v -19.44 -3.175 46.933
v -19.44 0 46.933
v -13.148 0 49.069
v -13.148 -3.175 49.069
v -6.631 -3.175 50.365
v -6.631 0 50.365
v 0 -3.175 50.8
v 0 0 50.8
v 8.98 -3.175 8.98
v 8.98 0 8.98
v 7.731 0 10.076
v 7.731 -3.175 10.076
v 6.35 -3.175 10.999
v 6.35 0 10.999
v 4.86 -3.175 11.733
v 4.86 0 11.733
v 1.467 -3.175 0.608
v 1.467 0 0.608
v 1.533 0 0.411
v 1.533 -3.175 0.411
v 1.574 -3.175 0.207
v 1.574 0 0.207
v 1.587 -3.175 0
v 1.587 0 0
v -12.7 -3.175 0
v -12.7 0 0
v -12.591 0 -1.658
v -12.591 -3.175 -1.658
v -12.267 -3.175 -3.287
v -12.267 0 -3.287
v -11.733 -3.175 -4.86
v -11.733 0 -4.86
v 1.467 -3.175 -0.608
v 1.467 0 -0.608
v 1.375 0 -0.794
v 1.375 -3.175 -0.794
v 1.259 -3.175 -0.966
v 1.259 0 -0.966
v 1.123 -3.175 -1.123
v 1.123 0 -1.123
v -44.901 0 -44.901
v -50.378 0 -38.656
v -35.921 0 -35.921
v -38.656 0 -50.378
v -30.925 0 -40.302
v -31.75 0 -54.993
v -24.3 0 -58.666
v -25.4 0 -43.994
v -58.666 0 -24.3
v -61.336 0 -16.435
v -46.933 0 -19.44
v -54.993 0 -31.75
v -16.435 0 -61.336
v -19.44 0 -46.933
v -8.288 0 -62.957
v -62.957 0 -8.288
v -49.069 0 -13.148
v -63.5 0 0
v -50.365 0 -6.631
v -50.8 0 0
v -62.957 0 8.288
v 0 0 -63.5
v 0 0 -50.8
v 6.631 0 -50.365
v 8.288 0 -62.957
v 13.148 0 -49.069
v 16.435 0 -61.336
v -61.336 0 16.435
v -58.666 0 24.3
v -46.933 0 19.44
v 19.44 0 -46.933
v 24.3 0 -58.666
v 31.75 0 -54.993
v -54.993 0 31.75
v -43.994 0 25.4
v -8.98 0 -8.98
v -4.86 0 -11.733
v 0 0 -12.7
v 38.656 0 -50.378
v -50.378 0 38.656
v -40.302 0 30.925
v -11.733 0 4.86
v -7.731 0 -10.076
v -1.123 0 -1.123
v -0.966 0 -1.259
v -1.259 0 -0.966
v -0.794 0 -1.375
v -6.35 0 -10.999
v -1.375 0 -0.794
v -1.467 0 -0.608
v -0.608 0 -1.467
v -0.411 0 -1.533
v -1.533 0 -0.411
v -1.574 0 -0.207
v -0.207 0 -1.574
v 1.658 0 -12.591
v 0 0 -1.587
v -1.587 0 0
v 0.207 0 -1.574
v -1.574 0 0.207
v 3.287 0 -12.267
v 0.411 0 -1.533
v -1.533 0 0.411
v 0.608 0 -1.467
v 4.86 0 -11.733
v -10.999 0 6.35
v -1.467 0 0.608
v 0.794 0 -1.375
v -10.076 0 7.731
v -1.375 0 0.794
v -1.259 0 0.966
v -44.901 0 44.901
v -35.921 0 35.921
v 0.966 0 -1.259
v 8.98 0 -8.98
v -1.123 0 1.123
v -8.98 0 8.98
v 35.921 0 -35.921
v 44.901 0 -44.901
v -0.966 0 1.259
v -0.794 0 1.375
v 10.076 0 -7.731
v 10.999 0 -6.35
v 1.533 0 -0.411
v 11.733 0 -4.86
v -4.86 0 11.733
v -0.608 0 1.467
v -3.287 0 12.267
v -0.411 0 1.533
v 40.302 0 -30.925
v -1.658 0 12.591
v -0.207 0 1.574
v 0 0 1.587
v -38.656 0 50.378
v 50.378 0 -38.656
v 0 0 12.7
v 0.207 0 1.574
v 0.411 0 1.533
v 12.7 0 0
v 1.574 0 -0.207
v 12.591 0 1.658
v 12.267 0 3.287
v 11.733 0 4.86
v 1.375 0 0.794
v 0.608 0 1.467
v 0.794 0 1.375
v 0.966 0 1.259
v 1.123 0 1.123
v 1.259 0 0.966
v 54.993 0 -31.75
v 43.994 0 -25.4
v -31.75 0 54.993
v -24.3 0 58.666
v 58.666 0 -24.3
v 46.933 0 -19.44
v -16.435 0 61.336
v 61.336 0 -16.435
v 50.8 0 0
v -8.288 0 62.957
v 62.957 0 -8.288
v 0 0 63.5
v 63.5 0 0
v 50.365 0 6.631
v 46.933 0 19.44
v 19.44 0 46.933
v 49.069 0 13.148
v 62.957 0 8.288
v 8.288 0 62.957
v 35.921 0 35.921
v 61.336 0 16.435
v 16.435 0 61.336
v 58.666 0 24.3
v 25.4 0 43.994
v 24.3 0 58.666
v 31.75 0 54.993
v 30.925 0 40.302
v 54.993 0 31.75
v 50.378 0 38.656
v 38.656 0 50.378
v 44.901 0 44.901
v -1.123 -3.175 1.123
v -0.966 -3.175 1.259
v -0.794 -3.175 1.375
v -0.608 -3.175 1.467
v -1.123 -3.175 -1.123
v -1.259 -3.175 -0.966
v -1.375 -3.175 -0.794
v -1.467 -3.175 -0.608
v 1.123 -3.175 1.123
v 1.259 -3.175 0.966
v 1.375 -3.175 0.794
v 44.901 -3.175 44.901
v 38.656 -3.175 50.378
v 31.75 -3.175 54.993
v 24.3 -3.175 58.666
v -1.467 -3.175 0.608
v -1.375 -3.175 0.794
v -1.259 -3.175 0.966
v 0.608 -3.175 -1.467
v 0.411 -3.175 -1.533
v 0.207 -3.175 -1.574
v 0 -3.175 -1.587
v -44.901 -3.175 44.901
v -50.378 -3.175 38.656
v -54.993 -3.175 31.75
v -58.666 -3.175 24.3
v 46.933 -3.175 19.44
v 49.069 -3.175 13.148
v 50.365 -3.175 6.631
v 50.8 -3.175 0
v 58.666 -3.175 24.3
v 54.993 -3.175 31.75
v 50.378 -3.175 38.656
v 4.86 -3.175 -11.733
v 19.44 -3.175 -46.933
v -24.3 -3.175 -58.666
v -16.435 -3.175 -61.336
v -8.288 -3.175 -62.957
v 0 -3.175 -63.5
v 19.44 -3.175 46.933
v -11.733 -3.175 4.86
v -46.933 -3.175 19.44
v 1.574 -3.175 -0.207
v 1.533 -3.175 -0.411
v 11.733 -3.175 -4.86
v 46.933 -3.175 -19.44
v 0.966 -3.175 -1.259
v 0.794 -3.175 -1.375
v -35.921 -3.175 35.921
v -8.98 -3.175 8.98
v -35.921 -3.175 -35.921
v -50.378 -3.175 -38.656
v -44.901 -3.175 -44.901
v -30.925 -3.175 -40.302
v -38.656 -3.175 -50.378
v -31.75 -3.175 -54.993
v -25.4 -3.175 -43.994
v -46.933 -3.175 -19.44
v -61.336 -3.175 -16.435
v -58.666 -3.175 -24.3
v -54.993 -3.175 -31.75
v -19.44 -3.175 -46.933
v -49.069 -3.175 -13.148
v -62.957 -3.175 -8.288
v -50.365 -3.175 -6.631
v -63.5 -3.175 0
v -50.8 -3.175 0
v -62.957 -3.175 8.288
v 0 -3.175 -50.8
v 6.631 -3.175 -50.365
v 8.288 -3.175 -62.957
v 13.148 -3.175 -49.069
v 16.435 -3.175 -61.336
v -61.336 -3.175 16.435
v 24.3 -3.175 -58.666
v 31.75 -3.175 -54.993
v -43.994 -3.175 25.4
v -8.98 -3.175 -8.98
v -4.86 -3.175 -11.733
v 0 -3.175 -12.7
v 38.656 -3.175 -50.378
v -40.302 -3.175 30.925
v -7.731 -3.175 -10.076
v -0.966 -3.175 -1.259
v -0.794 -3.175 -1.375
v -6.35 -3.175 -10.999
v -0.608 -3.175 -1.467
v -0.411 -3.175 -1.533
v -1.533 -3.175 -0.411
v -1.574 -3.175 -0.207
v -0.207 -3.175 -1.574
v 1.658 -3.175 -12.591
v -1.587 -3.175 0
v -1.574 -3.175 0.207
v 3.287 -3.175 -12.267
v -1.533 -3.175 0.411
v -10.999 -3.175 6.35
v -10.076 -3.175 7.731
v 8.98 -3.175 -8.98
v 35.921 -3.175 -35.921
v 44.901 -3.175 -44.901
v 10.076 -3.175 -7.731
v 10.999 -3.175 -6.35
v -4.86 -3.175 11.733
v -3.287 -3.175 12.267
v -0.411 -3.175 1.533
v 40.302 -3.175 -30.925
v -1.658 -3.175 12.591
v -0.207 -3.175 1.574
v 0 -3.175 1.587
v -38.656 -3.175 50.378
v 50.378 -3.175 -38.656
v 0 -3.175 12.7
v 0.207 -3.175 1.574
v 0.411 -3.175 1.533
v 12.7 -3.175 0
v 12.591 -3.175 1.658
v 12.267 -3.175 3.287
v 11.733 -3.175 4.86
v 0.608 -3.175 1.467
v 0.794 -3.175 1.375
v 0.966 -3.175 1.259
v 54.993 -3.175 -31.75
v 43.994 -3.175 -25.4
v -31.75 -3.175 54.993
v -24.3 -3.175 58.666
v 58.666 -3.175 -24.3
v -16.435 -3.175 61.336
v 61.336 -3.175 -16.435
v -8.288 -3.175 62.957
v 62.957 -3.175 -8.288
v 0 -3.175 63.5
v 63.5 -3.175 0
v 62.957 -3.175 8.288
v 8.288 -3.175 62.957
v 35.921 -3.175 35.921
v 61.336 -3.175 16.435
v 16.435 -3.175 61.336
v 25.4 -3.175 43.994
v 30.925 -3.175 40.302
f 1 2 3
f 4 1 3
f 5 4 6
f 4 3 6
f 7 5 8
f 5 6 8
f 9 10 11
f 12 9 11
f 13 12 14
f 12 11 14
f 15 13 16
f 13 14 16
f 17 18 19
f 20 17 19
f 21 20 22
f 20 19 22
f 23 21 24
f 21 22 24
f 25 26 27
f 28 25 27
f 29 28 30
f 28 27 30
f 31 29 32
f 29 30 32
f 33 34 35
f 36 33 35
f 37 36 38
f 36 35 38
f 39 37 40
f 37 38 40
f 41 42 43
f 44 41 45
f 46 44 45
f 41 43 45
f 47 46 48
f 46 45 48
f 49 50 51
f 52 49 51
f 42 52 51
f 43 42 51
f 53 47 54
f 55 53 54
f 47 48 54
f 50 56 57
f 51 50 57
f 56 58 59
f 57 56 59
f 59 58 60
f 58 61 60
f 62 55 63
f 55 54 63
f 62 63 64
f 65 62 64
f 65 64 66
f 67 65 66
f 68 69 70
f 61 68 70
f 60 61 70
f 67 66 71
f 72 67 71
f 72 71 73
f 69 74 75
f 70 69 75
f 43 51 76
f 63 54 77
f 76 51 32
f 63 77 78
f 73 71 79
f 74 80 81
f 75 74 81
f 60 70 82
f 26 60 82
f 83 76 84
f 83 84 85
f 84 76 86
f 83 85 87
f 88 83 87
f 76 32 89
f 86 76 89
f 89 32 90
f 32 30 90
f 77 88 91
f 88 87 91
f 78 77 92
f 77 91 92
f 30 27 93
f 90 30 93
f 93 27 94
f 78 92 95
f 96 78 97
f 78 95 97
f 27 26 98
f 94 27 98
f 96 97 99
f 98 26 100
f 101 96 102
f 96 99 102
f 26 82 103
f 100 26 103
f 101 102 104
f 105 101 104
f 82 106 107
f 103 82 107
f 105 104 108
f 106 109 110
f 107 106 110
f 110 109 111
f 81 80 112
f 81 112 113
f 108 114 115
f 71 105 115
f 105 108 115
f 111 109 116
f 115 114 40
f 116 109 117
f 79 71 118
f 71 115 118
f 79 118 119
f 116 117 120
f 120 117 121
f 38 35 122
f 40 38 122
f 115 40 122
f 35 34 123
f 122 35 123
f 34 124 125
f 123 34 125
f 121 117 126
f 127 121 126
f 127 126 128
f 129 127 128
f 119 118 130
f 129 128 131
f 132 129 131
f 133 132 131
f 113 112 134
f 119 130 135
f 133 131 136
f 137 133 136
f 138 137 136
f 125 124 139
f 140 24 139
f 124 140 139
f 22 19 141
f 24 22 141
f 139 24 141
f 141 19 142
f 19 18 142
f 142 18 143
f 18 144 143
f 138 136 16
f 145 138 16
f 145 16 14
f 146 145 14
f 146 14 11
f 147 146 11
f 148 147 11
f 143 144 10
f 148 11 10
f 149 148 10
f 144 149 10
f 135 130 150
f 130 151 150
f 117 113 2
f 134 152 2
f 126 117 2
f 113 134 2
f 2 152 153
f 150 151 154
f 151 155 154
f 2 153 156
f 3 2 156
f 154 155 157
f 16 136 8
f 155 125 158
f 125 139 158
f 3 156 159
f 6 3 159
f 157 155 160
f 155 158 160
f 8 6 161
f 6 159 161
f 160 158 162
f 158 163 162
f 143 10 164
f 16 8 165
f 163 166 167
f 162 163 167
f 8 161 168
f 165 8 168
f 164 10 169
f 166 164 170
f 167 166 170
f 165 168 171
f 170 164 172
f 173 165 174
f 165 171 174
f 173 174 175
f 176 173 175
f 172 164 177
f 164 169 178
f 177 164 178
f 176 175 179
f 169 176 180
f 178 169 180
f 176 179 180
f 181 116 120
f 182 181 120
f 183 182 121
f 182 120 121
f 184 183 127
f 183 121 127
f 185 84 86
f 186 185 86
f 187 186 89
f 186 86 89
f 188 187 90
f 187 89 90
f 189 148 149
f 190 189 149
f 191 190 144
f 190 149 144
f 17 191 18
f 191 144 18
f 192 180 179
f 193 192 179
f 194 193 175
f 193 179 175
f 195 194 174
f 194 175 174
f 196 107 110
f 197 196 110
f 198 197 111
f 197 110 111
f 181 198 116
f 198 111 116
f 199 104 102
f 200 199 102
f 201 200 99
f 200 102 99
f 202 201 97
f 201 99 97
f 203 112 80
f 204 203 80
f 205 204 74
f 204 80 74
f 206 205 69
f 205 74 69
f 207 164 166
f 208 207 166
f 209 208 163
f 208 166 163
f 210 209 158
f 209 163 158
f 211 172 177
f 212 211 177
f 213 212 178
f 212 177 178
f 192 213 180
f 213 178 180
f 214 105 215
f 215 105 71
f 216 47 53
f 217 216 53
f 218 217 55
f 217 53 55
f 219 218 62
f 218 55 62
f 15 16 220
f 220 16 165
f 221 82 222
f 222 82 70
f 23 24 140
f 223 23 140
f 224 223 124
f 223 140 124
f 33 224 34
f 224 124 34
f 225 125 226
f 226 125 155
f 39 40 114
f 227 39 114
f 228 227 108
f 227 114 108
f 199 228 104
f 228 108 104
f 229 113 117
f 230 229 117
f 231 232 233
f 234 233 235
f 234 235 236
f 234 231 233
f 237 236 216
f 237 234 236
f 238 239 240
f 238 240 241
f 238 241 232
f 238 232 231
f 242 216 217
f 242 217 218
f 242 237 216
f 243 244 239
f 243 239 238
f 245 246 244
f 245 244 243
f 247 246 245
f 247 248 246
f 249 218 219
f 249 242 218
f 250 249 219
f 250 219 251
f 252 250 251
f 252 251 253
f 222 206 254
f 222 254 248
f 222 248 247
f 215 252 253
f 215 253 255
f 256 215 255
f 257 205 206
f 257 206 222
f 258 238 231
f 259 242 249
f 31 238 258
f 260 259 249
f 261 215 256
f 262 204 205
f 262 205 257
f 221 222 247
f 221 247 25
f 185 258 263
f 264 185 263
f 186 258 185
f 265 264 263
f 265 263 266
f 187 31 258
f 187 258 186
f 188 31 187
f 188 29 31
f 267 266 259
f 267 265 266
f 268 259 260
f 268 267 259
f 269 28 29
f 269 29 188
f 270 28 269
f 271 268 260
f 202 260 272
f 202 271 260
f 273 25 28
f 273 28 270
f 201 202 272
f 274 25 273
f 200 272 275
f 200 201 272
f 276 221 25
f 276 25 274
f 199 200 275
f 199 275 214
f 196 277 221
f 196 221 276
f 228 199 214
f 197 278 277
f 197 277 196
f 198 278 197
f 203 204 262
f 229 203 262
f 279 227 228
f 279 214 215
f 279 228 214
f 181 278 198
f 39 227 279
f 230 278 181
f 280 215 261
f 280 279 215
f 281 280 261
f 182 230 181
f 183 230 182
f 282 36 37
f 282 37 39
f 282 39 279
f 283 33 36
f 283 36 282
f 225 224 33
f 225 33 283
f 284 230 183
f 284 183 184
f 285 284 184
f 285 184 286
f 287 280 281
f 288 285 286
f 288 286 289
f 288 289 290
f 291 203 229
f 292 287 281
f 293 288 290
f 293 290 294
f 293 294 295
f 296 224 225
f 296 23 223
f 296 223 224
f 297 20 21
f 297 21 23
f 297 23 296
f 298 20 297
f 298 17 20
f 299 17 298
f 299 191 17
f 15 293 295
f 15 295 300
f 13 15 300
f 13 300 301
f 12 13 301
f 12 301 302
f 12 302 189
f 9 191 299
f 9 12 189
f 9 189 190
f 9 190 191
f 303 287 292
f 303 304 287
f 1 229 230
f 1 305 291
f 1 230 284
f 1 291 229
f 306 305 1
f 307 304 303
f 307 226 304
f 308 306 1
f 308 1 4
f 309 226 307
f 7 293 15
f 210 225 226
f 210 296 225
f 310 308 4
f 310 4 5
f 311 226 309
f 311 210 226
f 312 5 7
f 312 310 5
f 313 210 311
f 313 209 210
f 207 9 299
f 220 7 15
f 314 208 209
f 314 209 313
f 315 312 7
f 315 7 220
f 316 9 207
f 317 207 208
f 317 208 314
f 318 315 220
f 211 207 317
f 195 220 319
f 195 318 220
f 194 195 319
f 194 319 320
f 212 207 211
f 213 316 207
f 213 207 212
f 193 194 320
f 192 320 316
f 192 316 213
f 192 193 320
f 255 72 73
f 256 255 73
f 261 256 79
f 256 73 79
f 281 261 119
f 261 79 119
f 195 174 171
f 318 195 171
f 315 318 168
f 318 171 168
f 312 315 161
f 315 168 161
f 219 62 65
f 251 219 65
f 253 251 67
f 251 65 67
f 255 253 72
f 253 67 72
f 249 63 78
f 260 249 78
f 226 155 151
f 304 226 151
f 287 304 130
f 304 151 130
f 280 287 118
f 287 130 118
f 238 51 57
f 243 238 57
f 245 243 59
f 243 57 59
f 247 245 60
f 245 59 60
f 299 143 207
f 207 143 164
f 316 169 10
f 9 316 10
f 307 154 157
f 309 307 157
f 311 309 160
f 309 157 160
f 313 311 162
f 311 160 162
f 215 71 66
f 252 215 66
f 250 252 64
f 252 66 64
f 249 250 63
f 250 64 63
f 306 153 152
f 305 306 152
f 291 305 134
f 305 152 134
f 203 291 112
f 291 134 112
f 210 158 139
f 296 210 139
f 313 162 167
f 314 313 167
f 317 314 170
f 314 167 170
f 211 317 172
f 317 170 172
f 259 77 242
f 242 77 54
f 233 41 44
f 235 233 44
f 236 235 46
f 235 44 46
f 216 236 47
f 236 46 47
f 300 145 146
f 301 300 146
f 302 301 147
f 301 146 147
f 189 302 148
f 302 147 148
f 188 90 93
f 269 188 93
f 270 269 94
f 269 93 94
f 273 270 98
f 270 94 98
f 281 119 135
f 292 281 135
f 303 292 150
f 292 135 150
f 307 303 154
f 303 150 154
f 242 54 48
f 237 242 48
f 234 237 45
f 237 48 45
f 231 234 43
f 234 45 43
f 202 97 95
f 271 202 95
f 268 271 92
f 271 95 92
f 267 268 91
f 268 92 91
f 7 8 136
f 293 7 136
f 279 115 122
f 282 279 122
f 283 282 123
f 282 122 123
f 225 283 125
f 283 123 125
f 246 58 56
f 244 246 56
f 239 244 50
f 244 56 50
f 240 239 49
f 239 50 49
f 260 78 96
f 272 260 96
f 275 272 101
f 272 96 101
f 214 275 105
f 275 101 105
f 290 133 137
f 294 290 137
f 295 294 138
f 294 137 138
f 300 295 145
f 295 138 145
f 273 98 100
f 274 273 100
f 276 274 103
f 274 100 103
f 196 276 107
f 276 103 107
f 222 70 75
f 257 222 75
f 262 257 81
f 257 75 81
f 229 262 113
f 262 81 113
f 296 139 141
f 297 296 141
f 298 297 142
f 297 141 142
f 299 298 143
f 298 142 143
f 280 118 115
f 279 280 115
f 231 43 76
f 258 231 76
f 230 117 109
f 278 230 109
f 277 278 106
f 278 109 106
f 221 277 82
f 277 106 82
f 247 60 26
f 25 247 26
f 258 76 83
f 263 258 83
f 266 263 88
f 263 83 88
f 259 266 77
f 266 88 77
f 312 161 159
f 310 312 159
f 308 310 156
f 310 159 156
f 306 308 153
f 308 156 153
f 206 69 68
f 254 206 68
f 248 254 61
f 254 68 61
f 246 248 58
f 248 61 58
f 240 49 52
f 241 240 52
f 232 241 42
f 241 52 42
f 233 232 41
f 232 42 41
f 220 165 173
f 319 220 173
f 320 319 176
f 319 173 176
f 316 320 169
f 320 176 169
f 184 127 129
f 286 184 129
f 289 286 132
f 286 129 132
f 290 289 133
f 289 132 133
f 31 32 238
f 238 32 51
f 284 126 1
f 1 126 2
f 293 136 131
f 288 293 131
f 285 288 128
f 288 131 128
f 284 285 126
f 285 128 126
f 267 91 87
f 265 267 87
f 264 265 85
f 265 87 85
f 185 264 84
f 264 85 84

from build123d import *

# Parameters (mm, degrees)
F1_DEPTH = 3.175


with BuildPart() as f1:
    # F0 (on Front) → F1 (new body)
    with BuildSketch(Plane.XZ):
        with BuildLine():
            Line((35.9210244843, 35.9210244843), (44.9012806053, 44.9012806053))
            ThreePointArc((44.9012806053, 44.9012806053), (35.2787097967, 52.7983203812), (24.3003979552, 58.6663503145))
            Line((24.3003979552, 58.6663503145), (19.4403183641, 46.9330802516))
            ThreePointArc((19.4403183641, 46.9330802516), (28.2229678374, 42.238656305), (35.9210244843, 35.9210244843))
        make_face()
        with BuildLine():
            Line((0, 50.8), (0, 63.5))
            ThreePointArc((0, 63.5), (-12.388235448, 62.2798653056), (-24.3003979552, 58.6663503145))
            Line((-24.3003979552, 58.6663503145), (-19.4403183641, 46.9330802516))
            ThreePointArc((-19.4403183641, 46.9330802516), (-9.9105883584, 49.8238922445), (0, 50.8))
        make_face()
        with BuildLine():
            Line((-35.9210244843, 35.9210244843), (-44.9012806053, 44.9012806053))
            ThreePointArc((-44.9012806053, 44.9012806053), (-52.7983203812, 35.2787097967), (-58.6663503145, 24.3003979552))
            Line((-58.6663503145, 24.3003979552), (-46.9330802516, 19.4403183641))
            ThreePointArc((-46.9330802516, 19.4403183641), (-42.238656305, 28.2229678374), (-35.9210244843, 35.9210244843))
        make_face()
        with BuildLine():
            Line((50.8, 0), (63.5, 0))
            ThreePointArc((63.5, 0), (62.2798653056, 12.388235448), (58.6663503145, 24.3003979552))
            Line((58.6663503145, 24.3003979552), (46.9330802516, 19.4403183641))
            ThreePointArc((46.9330802516, 19.4403183641), (49.8238922445, 9.9105883584), (50.8, 0))
        make_face()
        with BuildLine():
            ThreePointArc((-44.9012806053, -44.9012806053), (-35.2787097967, -52.7983203812), (-24.3003979552, -58.6663503145))
            Line((-24.3003979552, -58.6663503145), (-19.4403183641, -46.9330802516))
            ThreePointArc((-19.4403183641, -46.9330802516), (-28.2229678374, -42.238656305), (-35.9210244843, -35.9210244843))
            Line((-35.9210244843, -35.9210244843), (-44.9012806053, -44.9012806053))
        make_face()
        with BuildLine():
            ThreePointArc((0, -63.5), (12.388235448, -62.2798653056), (24.3003979552, -58.6663503145))
            Line((24.3003979552, -58.6663503145), (19.4403183641, -46.9330802516))
            ThreePointArc((19.4403183641, -46.9330802516), (9.9105883584, -49.8238922445), (0, -50.8))
            Line((0, -50.8), (0, -63.5))
        make_face()
        with BuildLine():
            ThreePointArc((44.9012806053, -44.9012806053), (52.7983203812, -35.2787097967), (58.6663503145, -24.3003979552))
            Line((58.6663503145, -24.3003979552), (46.9330802516, -19.4403183641))
            ThreePointArc((46.9330802516, -19.4403183641), (42.238656305, -28.2229678374), (35.9210244843, -35.9210244843))
            Line((35.9210244843, -35.9210244843), (44.9012806053, -44.9012806053))
        make_face()
        with BuildLine():
            Line((-8.9802561211, 8.9802561211), (-1.1225320151, 1.1225320151))
            ThreePointArc((-1.1225320151, 1.1225320151), (-0.8819677449, 1.3199580095), (-0.6075099489, 1.4666587579))
            Line((-0.6075099489, 1.4666587579), (-4.860079591, 11.7332700629))
            ThreePointArc((-4.860079591, 11.7332700629), (-7.0557419593, 10.5596640762), (-8.9802561211, 8.9802561211))
        make_face()
        with BuildLine():
            Line((0.6075099489, 1.4666587579), (4.860079591, 11.7332700629))
            ThreePointArc((4.860079591, 11.7332700629), (2.4776470896, 12.4559730611), (0, 12.7))
            Line((0, 12.7), (0, 1.5875))
            ThreePointArc((0, 1.5875), (0.3097058862, 1.5569966326), (0.6075099489, 1.4666587579))
        make_face()
        with BuildLine():
            Line((1.1225320151, 1.1225320151), (8.9802561211, 8.9802561211))
            ThreePointArc((8.9802561211, 8.9802561211), (7.0557419593, 10.5596640762), (4.860079591, 11.7332700629))
            Line((4.860079591, 11.7332700629), (0.6075099489, 1.4666587579))
            ThreePointArc((0.6075099489, 1.4666587579), (0.8819677449, 1.3199580095), (1.1225320151, 1.1225320151))
        make_face()
        with BuildLine():
            Line((1.4666587579, 0.6075099489), (11.7332700629, 4.860079591))
            ThreePointArc((11.7332700629, 4.860079591), (10.5596640762, 7.0557419593), (8.9802561211, 8.9802561211))
            Line((8.9802561211, 8.9802561211), (1.1225320151, 1.1225320151))
            ThreePointArc((1.1225320151, 1.1225320151), (1.3199580095, 0.8819677449), (1.4666587579, 0.6075099489))
        make_face()
        with BuildLine():
            Line((1.5875, 0), (12.7, 0))
            ThreePointArc((12.7, 0), (12.4559730611, 2.4776470896), (11.7332700629, 4.860079591))
            Line((11.7332700629, 4.860079591), (1.4666587579, 0.6075099489))
            ThreePointArc((1.4666587579, 0.6075099489), (1.5569966326, 0.3097058862), (1.5875, 0))
        make_face()
        with BuildLine():
            ThreePointArc((11.7332700629, -4.860079591), (12.4559730611, -2.4776470896), (12.7, 0))
            Line((12.7, 0), (1.5875, 0))
            ThreePointArc((1.5875, 0), (1.5569966326, -0.3097058862), (1.4666587579, -0.6075099489))
            Line((1.4666587579, -0.6075099489), (11.7332700629, -4.860079591))
        make_face()
        with BuildLine():
            ThreePointArc((4.860079591, -11.7332700629), (7.0557419593, -10.5596640762), (8.9802561211, -8.9802561211))
            Line((8.9802561211, -8.9802561211), (1.1225320151, -1.1225320151))
            ThreePointArc((1.1225320151, -1.1225320151), (0.8819677449, -1.3199580095), (0.6075099489, -1.4666587579))
            Line((0.6075099489, -1.4666587579), (4.860079591, -11.7332700629))
        make_face()
        with BuildLine():
            Line((-8.9802561211, -8.9802561211), (-1.1225320151, -1.1225320151))
            ThreePointArc((-1.1225320151, -1.1225320151), (-1.3199580095, -0.8819677449), (-1.4666587579, -0.6075099489))
            Line((-1.4666587579, -0.6075099489), (-11.7332700629, -4.860079591))
            ThreePointArc((-11.7332700629, -4.860079591), (-10.5596640762, -7.0557419593), (-8.9802561211, -8.9802561211))
        make_face()
        with BuildLine():
            Line((-12.7, 0), (-1.5875, 0))
            ThreePointArc((-1.5875, 0), (-1.5569966326, 0.3097058862), (-1.4666587579, 0.6075099489))
            Line((-1.4666587579, 0.6075099489), (-11.7332700629, 4.860079591))
            ThreePointArc((-11.7332700629, 4.860079591), (-12.4559730611, 2.4776470896), (-12.7, 0))
        make_face()
        with BuildLine():
            ThreePointArc((-1.4666587579, 0.6075099489), (-1.3199580095, 0.8819677449), (-1.1225320151, 1.1225320151))
            Line((-1.1225320151, 1.1225320151), (-8.9802561211, 8.9802561211))
            ThreePointArc((-8.9802561211, 8.9802561211), (-10.5596640762, 7.0557419593), (-11.7332700629, 4.860079591))
            Line((-11.7332700629, 4.860079591), (-1.4666587579, 0.6075099489))
        make_face()
        with BuildLine():
            ThreePointArc((-1.4666587579, -0.6075099489), (-1.5569966326, -0.3097058862), (-1.5875, 0))
            Line((-1.5875, 0), (-12.7, 0))
            ThreePointArc((-12.7, 0), (-12.4559730611, -2.4776470896), (-11.7332700629, -4.860079591))
            Line((-11.7332700629, -4.860079591), (-1.4666587579, -0.6075099489))
        make_face()
        with BuildLine():
            ThreePointArc((-0.6075099489, -1.4666587579), (-0.8819677449, -1.3199580095), (-1.1225320151, -1.1225320151))
            Line((-1.1225320151, -1.1225320151), (-8.9802561211, -8.9802561211))
            ThreePointArc((-8.9802561211, -8.9802561211), (-7.0557419593, -10.5596640762), (-4.860079591, -11.7332700629))
            Line((-4.860079591, -11.7332700629), (-0.6075099489, -1.4666587579))
        make_face()
        with BuildLine():
            Line((0, -12.7), (0, -1.5875))
            ThreePointArc((0, -1.5875), (-0.3097058862, -1.5569966326), (-0.6075099489, -1.4666587579))
            Line((-0.6075099489, -1.4666587579), (-4.860079591, -11.7332700629))
            ThreePointArc((-4.860079591, -11.7332700629), (-2.4776470896, -12.4559730611), (0, -12.7))
        make_face()
        with BuildLine():
            ThreePointArc((0, -12.7), (2.4776470896, -12.4559730611), (4.860079591, -11.7332700629))
            Line((4.860079591, -11.7332700629), (0.6075099489, -1.4666587579))
            ThreePointArc((0.6075099489, -1.4666587579), (0.3097058862, -1.5569966326), (0, -1.5875))
            Line((0, -1.5875), (0, -12.7))
        make_face()
        with BuildLine():
            ThreePointArc((8.9802561211, -8.9802561211), (10.5596640762, -7.0557419593), (11.7332700629, -4.860079591))
            Line((11.7332700629, -4.860079591), (1.4666587579, -0.6075099489))
            ThreePointArc((1.4666587579, -0.6075099489), (1.3199580095, -0.8819677449), (1.1225320151, -1.1225320151))
            Line((1.1225320151, -1.1225320151), (8.9802561211, -8.9802561211))
        make_face()
        with BuildLine():
            ThreePointArc((-0.6075099489, 1.4666587579), (-0.3097058862, 1.5569966326), (0, 1.5875))
            Line((0, 1.5875), (0, 12.7))
            ThreePointArc((0, 12.7), (-2.4776470896, 12.4559730611), (-4.860079591, 11.7332700629))
            Line((-4.860079591, 11.7332700629), (-0.6075099489, 1.4666587579))
        make_face()
        with BuildLine():
            ThreePointArc((-63.5, 0), (-62.2798653056, -12.388235448), (-58.6663503145, -24.3003979552))
            Line((-58.6663503145, -24.3003979552), (-46.9330802516, -19.4403183641))
            ThreePointArc((-46.9330802516, -19.4403183641), (-49.8238922445, -9.9105883584), (-50.8, 0))
            Line((-50.8, 0), (-63.5, 0))
        make_face()
        with BuildLine():
            Line((-19.4403183641, 46.9330802516), (-24.3003979552, 58.6663503145))
            ThreePointArc((-24.3003979552, 58.6663503145), (-35.2787097967, 52.7983203812), (-44.9012806053, 44.9012806053))
            Line((-44.9012806053, 44.9012806053), (-35.9210244843, 35.9210244843))
            ThreePointArc((-35.9210244843, 35.9210244843), (-28.2229678374, 42.238656305), (-19.4403183641, 46.9330802516))
        make_face()
        with BuildLine():
            Line((19.4403183641, 46.9330802516), (24.3003979552, 58.6663503145))
            ThreePointArc((24.3003979552, 58.6663503145), (12.388235448, 62.2798653056), (0, 63.5))
            Line((0, 63.5), (0, 50.8))
            ThreePointArc((0, 50.8), (9.9105883584, 49.8238922445), (19.4403183641, 46.9330802516))
        make_face()
        with BuildLine():
            Line((46.9330802516, 19.4403183641), (58.6663503145, 24.3003979552))
            ThreePointArc((58.6663503145, 24.3003979552), (52.7983203812, 35.2787097967), (44.9012806053, 44.9012806053))
            Line((44.9012806053, 44.9012806053), (35.9210244843, 35.9210244843))
            ThreePointArc((35.9210244843, 35.9210244843), (42.238656305, 28.2229678374), (46.9330802516, 19.4403183641))
        make_face()
        with BuildLine():
            ThreePointArc((24.3003979552, -58.6663503145), (35.2787097967, -52.7983203812), (44.9012806053, -44.9012806053))
            Line((44.9012806053, -44.9012806053), (35.9210244843, -35.9210244843))
            ThreePointArc((35.9210244843, -35.9210244843), (28.2229678374, -42.238656305), (19.4403183641, -46.9330802516))
            Line((19.4403183641, -46.9330802516), (24.3003979552, -58.6663503145))
        make_face()
        with BuildLine():
            ThreePointArc((-24.3003979552, -58.6663503145), (-12.388235448, -62.2798653056), (0, -63.5))
            Line((0, -63.5), (0, -50.8))
            ThreePointArc((0, -50.8), (-9.9105883584, -49.8238922445), (-19.4403183641, -46.9330802516))
            Line((-19.4403183641, -46.9330802516), (-24.3003979552, -58.6663503145))
        make_face()
        with BuildLine():
            ThreePointArc((-58.6663503145, -24.3003979552), (-52.7983203812, -35.2787097967), (-44.9012806053, -44.9012806053))
            Line((-44.9012806053, -44.9012806053), (-35.9210244843, -35.9210244843))
            ThreePointArc((-35.9210244843, -35.9210244843), (-42.238656305, -28.2229678374), (-46.9330802516, -19.4403183641))
            Line((-46.9330802516, -19.4403183641), (-58.6663503145, -24.3003979552))
        make_face()
        with BuildLine():
            ThreePointArc((58.6663503145, -24.3003979552), (62.2798653056, -12.388235448), (63.5, 0))
            Line((63.5, 0), (50.8, 0))
            ThreePointArc((50.8, 0), (49.8238922445, -9.9105883584), (46.9330802516, -19.4403183641))
            Line((46.9330802516, -19.4403183641), (58.6663503145, -24.3003979552))
        make_face()
        with BuildLine():
            Line((-50.8, 0), (-12.7, 0))
            ThreePointArc((-12.7, 0), (-12.4559730611, 2.4776470896), (-11.7332700629, 4.860079591))
            Line((-11.7332700629, 4.860079591), (-46.9330802516, 19.4403183641))
            ThreePointArc((-46.9330802516, 19.4403183641), (-49.8238922445, 9.9105883584), (-50.8, 0))
        make_face()
        with BuildLine():
            Line((-4.860079591, 11.7332700629), (-19.4403183641, 46.9330802516))
            ThreePointArc((-19.4403183641, 46.9330802516), (-28.2229678374, 42.238656305), (-35.9210244843, 35.9210244843))
            Line((-35.9210244843, 35.9210244843), (-8.9802561211, 8.9802561211))
            ThreePointArc((-8.9802561211, 8.9802561211), (-7.0557419593, 10.5596640762), (-4.860079591, 11.7332700629))
        make_face()
        with BuildLine():
            Line((4.860079591, 11.7332700629), (19.4403183641, 46.9330802516))
            ThreePointArc((19.4403183641, 46.9330802516), (9.9105883584, 49.8238922445), (0, 50.8))
            Line((0, 50.8), (0, 12.7))
            ThreePointArc((0, 12.7), (2.4776470896, 12.4559730611), (4.860079591, 11.7332700629))
        make_face()
        with BuildLine():
            Line((11.7332700629, 4.860079591), (46.9330802516, 19.4403183641))
            ThreePointArc((46.9330802516, 19.4403183641), (42.238656305, 28.2229678374), (35.9210244843, 35.9210244843))
            Line((35.9210244843, 35.9210244843), (8.9802561211, 8.9802561211))
            ThreePointArc((8.9802561211, 8.9802561211), (10.5596640762, 7.0557419593), (11.7332700629, 4.860079591))
        make_face()
        with BuildLine():
            ThreePointArc((46.9330802516, -19.4403183641), (49.8238922445, -9.9105883584), (50.8, 0))
            Line((50.8, 0), (12.7, 0))
            ThreePointArc((12.7, 0), (12.4559730611, -2.4776470896), (11.7332700629, -4.860079591))
            Line((11.7332700629, -4.860079591), (46.9330802516, -19.4403183641))
        make_face()
        with BuildLine():
            ThreePointArc((-19.4403183641, -46.9330802516), (-9.9105883584, -49.8238922445), (0, -50.8))
            Line((0, -50.8), (0, -12.7))
            ThreePointArc((0, -12.7), (-2.4776470896, -12.4559730611), (-4.860079591, -11.7332700629))
            Line((-4.860079591, -11.7332700629), (-19.4403183641, -46.9330802516))
        make_face()
        with BuildLine():
            Line((-35.9210244843, -35.9210244843), (-8.9802561211, -8.9802561211))
            ThreePointArc((-8.9802561211, -8.9802561211), (-10.5596640762, -7.0557419593), (-11.7332700629, -4.860079591))
            Line((-11.7332700629, -4.860079591), (-46.9330802516, -19.4403183641))
            ThreePointArc((-46.9330802516, -19.4403183641), (-42.238656305, -28.2229678374), (-35.9210244843, -35.9210244843))
        make_face()
        with BuildLine():
            Line((-46.9330802516, 19.4403183641), (-58.6663503145, 24.3003979552))
            ThreePointArc((-58.6663503145, 24.3003979552), (-62.2798653056, 12.388235448), (-63.5, 0))
            Line((-63.5, 0), (-50.8, 0))
            ThreePointArc((-50.8, 0), (-49.8238922445, 9.9105883584), (-46.9330802516, 19.4403183641))
        make_face()
        with BuildLine():
            ThreePointArc((19.4403183641, -46.9330802516), (28.2229678374, -42.238656305), (35.9210244843, -35.9210244843))
            Line((35.9210244843, -35.9210244843), (8.9802561211, -8.9802561211))
            ThreePointArc((8.9802561211, -8.9802561211), (7.0557419593, -10.5596640762), (4.860079591, -11.7332700629))
            Line((4.860079591, -11.7332700629), (19.4403183641, -46.9330802516))
        make_face()
    extrude(amount=F1_DEPTH)


solid = f1.part
